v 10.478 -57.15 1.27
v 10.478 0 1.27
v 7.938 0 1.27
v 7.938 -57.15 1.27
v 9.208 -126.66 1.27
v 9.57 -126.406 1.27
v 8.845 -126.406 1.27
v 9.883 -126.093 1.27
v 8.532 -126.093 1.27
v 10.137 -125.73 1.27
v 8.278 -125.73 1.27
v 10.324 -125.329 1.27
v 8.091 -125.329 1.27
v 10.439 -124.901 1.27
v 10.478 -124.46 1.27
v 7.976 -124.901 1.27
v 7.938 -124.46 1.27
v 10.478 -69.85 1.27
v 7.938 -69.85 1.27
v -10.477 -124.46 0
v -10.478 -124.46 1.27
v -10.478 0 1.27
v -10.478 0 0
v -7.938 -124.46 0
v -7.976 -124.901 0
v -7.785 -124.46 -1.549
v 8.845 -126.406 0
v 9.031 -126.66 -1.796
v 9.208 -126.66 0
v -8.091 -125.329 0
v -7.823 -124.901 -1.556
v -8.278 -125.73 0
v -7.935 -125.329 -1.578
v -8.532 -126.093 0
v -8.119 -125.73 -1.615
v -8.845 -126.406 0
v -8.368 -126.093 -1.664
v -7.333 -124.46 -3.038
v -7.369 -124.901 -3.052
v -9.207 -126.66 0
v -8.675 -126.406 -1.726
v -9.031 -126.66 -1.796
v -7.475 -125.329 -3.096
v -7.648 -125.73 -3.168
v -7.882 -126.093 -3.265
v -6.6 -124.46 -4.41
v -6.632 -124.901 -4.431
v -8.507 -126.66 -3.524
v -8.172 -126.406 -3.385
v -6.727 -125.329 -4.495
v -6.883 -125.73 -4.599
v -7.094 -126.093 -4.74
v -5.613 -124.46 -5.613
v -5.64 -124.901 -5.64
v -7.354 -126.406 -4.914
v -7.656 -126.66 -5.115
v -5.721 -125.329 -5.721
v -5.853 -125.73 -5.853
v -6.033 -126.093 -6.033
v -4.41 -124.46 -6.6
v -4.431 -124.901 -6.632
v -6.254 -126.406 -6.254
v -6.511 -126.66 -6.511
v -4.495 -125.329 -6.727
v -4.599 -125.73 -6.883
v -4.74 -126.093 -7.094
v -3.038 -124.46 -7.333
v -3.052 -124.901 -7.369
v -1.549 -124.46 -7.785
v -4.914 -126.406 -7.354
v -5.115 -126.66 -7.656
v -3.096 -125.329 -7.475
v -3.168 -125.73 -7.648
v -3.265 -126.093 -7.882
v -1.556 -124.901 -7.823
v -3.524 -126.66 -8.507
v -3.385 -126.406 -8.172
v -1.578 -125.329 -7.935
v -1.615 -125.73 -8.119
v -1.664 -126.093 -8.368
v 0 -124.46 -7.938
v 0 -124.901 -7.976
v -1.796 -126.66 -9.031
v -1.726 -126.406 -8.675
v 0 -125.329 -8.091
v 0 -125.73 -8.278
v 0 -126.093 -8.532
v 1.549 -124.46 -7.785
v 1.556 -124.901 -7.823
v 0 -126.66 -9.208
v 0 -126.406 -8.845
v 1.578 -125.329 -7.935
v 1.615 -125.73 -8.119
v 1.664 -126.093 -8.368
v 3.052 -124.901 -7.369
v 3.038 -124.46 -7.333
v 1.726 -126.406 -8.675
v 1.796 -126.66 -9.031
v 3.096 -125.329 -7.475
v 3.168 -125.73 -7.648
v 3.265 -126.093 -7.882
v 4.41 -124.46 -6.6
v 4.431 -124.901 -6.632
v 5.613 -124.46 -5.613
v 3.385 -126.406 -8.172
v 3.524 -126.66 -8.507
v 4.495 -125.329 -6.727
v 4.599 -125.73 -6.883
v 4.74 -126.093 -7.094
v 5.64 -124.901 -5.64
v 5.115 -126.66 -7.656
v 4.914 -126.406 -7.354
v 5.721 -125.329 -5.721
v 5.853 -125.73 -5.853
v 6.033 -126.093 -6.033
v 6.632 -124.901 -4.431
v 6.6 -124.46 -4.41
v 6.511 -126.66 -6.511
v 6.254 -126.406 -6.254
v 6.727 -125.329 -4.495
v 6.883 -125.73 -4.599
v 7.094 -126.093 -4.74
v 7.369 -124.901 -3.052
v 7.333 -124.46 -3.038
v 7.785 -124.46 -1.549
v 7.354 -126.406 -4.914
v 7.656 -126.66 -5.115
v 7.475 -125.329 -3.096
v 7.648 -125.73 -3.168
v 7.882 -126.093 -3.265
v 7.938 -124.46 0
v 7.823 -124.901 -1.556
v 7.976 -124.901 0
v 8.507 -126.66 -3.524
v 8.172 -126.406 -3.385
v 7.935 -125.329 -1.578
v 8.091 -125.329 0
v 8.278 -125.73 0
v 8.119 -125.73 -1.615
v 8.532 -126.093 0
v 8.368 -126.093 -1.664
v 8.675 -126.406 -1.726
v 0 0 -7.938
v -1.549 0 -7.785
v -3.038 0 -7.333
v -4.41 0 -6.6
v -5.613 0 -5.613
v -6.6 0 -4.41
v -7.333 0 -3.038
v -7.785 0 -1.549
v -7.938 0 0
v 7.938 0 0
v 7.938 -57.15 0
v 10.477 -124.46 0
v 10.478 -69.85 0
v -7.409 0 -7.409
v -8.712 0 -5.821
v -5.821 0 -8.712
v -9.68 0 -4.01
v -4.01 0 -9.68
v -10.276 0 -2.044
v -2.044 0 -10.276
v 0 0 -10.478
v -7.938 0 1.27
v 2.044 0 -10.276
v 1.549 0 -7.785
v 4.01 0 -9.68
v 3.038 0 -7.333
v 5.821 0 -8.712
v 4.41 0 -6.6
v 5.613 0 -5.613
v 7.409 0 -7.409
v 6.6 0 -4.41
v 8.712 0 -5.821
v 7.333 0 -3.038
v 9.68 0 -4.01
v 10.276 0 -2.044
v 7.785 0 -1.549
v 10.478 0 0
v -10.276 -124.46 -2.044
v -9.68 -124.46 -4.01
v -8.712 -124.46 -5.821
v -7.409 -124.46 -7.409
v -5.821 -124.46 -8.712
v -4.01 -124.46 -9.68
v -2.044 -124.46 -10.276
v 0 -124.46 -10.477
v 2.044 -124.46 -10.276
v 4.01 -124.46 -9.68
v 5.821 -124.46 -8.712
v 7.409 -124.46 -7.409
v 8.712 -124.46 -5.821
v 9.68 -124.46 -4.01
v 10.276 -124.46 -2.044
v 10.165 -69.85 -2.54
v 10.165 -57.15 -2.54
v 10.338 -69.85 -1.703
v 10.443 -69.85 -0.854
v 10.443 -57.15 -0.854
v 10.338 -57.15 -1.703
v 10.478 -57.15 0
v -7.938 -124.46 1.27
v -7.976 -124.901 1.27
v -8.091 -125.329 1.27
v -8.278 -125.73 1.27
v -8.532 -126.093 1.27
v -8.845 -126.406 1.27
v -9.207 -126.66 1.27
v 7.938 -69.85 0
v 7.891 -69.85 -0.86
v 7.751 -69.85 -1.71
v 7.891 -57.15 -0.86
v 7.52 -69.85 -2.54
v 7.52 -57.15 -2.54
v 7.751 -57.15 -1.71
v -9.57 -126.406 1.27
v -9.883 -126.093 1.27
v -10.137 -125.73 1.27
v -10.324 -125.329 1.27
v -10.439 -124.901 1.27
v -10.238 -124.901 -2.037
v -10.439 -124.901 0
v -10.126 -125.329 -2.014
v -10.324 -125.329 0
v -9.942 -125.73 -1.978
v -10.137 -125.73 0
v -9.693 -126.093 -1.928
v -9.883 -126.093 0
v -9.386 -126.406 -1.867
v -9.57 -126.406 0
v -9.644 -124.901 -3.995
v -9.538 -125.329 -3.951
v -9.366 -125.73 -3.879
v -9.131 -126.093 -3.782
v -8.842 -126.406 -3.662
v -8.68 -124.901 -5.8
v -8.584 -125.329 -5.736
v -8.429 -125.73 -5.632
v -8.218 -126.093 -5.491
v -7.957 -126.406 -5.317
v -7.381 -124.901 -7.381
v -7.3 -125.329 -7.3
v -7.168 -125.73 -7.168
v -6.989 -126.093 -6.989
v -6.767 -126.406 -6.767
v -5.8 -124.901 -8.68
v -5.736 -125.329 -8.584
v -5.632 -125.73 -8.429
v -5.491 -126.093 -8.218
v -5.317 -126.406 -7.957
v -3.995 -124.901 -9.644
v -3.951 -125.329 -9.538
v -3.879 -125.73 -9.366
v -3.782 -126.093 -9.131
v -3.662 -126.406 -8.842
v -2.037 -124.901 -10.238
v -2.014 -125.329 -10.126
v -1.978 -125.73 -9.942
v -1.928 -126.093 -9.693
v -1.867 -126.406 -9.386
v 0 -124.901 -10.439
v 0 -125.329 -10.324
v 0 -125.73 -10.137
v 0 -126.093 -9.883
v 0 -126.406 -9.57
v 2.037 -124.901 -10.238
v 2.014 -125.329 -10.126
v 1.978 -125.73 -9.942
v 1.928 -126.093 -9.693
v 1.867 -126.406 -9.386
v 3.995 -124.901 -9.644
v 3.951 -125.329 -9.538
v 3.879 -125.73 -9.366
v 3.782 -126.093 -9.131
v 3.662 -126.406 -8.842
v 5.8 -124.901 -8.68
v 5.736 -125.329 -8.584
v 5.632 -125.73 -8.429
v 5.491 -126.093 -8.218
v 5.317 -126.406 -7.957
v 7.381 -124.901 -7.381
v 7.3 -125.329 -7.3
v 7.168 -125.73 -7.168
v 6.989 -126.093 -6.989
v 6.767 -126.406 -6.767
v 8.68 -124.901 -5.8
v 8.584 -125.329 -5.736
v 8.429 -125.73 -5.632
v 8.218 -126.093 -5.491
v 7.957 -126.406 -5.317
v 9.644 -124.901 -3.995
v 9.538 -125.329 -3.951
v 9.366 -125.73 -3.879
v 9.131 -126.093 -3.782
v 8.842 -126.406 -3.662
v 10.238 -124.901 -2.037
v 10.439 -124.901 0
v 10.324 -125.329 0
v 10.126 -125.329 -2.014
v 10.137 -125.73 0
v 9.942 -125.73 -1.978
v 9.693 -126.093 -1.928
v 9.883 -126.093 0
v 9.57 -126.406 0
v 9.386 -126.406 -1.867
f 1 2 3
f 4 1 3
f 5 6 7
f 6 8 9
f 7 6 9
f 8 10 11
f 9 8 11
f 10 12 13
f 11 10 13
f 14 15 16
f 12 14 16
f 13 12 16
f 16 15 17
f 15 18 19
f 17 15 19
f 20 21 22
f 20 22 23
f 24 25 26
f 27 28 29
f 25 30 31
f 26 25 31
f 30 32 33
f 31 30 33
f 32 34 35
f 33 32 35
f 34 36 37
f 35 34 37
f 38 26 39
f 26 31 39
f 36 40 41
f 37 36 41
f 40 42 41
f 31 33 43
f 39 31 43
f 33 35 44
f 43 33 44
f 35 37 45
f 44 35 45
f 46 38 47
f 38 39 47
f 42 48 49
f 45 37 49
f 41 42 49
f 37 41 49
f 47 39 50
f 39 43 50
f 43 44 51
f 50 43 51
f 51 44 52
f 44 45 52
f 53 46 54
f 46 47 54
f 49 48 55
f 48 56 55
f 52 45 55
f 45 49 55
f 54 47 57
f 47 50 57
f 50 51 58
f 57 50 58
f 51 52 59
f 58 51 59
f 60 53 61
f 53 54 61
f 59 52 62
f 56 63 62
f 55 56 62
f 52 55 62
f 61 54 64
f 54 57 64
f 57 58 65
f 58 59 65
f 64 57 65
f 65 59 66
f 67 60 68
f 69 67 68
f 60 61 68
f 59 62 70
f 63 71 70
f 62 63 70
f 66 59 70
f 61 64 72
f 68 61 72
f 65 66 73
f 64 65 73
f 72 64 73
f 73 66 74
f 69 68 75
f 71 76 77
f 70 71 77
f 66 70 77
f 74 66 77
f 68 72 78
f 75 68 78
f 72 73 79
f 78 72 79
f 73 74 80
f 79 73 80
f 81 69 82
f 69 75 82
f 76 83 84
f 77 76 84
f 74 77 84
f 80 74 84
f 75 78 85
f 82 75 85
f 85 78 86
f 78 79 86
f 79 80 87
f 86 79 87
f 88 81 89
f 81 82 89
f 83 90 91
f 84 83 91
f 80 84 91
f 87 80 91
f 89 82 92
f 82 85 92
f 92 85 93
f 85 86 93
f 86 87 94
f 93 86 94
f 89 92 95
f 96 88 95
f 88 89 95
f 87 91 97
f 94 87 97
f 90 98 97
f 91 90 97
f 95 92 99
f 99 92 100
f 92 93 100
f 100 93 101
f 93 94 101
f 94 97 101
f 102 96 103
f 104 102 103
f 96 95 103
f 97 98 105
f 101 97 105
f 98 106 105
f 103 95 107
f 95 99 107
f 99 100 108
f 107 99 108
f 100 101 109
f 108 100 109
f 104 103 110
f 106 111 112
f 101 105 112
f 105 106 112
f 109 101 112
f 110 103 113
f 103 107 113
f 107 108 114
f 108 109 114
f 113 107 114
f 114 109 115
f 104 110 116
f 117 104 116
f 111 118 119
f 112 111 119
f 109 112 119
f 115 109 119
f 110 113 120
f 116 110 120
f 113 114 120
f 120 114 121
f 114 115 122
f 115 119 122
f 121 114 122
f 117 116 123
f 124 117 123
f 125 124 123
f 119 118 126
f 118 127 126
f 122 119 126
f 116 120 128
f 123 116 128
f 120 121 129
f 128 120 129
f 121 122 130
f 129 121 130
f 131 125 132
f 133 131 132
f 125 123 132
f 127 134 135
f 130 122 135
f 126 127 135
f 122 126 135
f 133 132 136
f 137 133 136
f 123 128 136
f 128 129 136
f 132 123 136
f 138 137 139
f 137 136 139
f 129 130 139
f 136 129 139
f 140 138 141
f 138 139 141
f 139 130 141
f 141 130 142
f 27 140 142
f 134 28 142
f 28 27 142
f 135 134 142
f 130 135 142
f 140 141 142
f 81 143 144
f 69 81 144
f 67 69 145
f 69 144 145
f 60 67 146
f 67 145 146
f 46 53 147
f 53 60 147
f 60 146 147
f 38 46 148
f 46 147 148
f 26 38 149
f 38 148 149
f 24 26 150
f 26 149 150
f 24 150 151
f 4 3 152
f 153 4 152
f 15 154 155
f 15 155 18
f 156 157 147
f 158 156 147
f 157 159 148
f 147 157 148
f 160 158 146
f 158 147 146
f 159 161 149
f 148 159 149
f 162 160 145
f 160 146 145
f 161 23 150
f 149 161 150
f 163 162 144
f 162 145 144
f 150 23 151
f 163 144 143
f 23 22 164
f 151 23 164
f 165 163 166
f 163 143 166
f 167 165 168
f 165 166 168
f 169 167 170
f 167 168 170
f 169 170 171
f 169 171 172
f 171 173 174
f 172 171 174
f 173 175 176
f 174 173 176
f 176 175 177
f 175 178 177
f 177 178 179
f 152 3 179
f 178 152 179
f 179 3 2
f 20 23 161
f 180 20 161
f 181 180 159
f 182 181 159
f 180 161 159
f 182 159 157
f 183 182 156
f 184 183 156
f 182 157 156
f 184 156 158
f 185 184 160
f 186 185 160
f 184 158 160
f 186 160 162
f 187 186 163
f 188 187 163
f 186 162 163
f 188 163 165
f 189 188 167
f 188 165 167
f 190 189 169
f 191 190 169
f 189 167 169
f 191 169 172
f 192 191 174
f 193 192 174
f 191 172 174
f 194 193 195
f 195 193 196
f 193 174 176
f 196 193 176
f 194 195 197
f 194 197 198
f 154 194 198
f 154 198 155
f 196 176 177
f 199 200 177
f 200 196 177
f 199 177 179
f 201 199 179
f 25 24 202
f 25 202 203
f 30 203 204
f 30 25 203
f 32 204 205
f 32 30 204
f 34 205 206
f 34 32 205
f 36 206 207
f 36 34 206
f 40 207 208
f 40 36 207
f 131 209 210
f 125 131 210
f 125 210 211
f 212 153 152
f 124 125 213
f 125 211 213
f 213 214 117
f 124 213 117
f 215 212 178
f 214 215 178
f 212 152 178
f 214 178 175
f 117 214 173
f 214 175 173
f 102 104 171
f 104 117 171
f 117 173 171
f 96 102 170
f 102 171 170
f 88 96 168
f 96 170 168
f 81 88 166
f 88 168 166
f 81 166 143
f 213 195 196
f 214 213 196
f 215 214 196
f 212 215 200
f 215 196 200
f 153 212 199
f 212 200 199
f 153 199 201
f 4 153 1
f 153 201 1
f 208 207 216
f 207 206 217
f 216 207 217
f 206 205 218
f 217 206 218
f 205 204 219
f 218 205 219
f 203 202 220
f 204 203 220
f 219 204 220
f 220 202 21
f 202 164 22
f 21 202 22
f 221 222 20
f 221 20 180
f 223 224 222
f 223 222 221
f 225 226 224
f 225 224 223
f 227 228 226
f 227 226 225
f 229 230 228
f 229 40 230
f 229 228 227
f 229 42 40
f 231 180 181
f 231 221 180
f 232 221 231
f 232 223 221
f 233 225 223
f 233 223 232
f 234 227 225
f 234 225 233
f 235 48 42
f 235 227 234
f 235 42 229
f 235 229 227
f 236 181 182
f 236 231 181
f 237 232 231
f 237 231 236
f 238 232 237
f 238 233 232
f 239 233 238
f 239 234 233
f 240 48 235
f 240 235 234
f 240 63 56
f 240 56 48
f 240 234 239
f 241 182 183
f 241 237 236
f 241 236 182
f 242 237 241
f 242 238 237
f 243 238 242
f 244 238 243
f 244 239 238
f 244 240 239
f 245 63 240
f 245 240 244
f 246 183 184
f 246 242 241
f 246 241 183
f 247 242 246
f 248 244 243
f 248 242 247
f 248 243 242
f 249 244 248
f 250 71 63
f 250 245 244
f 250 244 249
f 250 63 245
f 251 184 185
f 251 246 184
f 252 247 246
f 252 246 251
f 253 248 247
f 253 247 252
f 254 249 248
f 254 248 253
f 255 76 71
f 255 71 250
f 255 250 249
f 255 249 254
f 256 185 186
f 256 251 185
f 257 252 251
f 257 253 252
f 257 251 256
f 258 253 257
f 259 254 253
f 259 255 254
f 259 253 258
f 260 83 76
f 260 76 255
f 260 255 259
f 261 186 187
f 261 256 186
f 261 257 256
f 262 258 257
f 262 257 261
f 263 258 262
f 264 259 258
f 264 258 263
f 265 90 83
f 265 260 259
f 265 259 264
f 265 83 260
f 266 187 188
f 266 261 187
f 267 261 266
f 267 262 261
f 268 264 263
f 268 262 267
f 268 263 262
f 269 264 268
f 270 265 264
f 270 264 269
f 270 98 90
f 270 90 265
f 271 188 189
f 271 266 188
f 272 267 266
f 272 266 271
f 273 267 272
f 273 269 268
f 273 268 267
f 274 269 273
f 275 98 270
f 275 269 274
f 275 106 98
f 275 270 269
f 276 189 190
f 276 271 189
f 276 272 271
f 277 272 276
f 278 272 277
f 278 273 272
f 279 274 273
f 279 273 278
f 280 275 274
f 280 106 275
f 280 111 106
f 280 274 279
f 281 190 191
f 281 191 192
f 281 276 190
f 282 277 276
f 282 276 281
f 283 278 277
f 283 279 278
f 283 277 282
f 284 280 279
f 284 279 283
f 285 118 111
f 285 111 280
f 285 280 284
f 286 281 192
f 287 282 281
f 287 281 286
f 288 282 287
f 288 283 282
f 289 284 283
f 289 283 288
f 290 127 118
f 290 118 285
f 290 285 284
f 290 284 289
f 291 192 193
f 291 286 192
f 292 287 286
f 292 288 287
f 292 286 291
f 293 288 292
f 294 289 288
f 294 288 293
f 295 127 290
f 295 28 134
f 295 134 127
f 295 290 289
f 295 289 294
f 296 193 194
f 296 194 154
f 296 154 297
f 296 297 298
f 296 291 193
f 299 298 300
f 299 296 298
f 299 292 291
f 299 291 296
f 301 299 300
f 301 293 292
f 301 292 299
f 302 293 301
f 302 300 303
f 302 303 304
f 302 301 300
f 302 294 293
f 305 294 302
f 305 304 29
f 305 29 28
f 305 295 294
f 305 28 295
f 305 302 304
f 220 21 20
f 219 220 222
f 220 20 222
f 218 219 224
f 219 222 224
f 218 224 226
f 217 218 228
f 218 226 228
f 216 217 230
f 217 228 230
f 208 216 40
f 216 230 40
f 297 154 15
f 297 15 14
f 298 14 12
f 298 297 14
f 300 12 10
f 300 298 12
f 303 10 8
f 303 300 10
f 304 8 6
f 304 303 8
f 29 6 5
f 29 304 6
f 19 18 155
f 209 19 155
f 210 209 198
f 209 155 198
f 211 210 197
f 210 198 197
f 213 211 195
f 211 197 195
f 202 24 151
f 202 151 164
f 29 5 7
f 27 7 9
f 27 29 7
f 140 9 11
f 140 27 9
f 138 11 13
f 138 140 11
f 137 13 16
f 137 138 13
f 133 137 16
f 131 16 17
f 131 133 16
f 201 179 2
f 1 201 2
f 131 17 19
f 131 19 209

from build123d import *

# Parameters (mm, degrees)
F1_DEPTH    = 127
F2_W        = 12.7
F2_H        = 2.54
F2_H_2      = 1.27
F3_DEPTH    = 9.525
F4_T1_DEPTH = 7.62
F4_T4_ANGLE = 180
F4_T6_ANGLE = 180


# Not quite as in the source:
# - a fillet or chamfer that OpenCascade refuses, or shapes differently, is made with other operations: its cross-section is extruded or revolved along the edge and cut away or added


with BuildPart() as f1:
    # F0 (on Front) → F1 (new body)
    with BuildSketch(Plane.XZ):
        with BuildLine():
            ThreePointArc((0, -7.9375), (-5.6126600757, -5.6126600757), (-7.9375, 0))
            Line((-7.9375, 0), (-7.9375, 1.27))
            Line((-7.9375, 1.27), (-10.4775, 1.27))
            Line((-10.4775, 1.27), (-10.4775, 0))
            ThreePointArc((-10.4775, 0), (0, -10.4775), (10.4775, 0))
            Line((10.4775, 0), (10.4775, 1.27))
            Line((10.4775, 1.27), (7.9375, 1.27))
            Line((7.9375, 1.27), (7.9375, 0))
            ThreePointArc((7.9375, 0), (5.6126600757, -5.6126600757), (0, -7.9375))
        make_face()
    extrude(amount=F1_DEPTH)

    # F2 (on face) → F3 (cut)
    with BuildSketch(Plane.YZ.offset(10.4775)):
        with Locations((-63.5, -1.27)):
            Rectangle(F2_W, F2_H)
        with Locations((-63.5, 0.635)):
            Rectangle(F2_W, F2_H_2)
    extrude(amount=-F3_DEPTH, mode=Mode.SUBTRACT)

    # F4: fillet of radius 2.54 on 2 edges, made by hand

    # F4_s2 → F4_t1 (cut)
    with BuildSketch(Plane.XY):
        with BuildLine():
            ThreePointArc((-10.4775, -124.46), (-9.7335512242, -126.2560512242), (-7.9375, -127))
            Line((-7.9375, -127), (-10.4775, -127))
            Line((-10.4775, -127), (-10.4775, -124.46))
        make_face()
        with BuildLine():
            ThreePointArc((10.4775, -124.46), (9.7335512242, -126.2560512242), (7.9375, -127))
            Line((7.9375, -127), (10.4775, -127))
            Line((10.4775, -127), (10.4775, -124.46))
        make_face()
        with BuildLine():
            ThreePointArc((-7.9375, -124.46), (-8.6814487758, -126.2560512242), (-10.4775, -127))
            Line((-10.4775, -127), (-7.9375, -127))
            Line((-7.9375, -127), (-7.9375, -124.46))
        make_face()
        with BuildLine():
            ThreePointArc((10.4775, -127), (8.6814487758, -126.2560512242), (7.9375, -124.46))
            Line((7.9375, -124.46), (7.9375, -127))
            Line((7.9375, -127), (10.4775, -127))
        make_face()
    extrude(amount=F4_T1_DEPTH, mode=Mode.SUBTRACT)

    # F4_s3 → F4_t4 (revolve, cut)
    with BuildSketch(Plane.XY):
        with BuildLine():
            ThreePointArc((-7.9375, -124.46), (-8.6814487758, -126.2560512242), (-10.4775, -127))
            Line((-10.4775, -127), (-7.9375, -127))
            Line((-7.9375, -127), (-7.9375, -124.46))
        make_face()
    revolve(axis=Axis((0, -127, 0), (0, -1, 0)), revolution_arc=F4_T4_ANGLE, mode=Mode.SUBTRACT)

    # F4_s5 → F4_t6 (revolve, cut)
    with BuildSketch(Plane.XY):
        with BuildLine():
            ThreePointArc((-10.4775, -124.46), (-9.7335512242, -126.2560512242), (-7.9375, -127))
            Line((-7.9375, -127), (-10.4775, -127))
            Line((-10.4775, -127), (-10.4775, -124.46))
        make_face()
    revolve(axis=Axis((0, -127, 0), (0, -1, 0)), revolution_arc=F4_T6_ANGLE, mode=Mode.SUBTRACT)


solid = f1.part
